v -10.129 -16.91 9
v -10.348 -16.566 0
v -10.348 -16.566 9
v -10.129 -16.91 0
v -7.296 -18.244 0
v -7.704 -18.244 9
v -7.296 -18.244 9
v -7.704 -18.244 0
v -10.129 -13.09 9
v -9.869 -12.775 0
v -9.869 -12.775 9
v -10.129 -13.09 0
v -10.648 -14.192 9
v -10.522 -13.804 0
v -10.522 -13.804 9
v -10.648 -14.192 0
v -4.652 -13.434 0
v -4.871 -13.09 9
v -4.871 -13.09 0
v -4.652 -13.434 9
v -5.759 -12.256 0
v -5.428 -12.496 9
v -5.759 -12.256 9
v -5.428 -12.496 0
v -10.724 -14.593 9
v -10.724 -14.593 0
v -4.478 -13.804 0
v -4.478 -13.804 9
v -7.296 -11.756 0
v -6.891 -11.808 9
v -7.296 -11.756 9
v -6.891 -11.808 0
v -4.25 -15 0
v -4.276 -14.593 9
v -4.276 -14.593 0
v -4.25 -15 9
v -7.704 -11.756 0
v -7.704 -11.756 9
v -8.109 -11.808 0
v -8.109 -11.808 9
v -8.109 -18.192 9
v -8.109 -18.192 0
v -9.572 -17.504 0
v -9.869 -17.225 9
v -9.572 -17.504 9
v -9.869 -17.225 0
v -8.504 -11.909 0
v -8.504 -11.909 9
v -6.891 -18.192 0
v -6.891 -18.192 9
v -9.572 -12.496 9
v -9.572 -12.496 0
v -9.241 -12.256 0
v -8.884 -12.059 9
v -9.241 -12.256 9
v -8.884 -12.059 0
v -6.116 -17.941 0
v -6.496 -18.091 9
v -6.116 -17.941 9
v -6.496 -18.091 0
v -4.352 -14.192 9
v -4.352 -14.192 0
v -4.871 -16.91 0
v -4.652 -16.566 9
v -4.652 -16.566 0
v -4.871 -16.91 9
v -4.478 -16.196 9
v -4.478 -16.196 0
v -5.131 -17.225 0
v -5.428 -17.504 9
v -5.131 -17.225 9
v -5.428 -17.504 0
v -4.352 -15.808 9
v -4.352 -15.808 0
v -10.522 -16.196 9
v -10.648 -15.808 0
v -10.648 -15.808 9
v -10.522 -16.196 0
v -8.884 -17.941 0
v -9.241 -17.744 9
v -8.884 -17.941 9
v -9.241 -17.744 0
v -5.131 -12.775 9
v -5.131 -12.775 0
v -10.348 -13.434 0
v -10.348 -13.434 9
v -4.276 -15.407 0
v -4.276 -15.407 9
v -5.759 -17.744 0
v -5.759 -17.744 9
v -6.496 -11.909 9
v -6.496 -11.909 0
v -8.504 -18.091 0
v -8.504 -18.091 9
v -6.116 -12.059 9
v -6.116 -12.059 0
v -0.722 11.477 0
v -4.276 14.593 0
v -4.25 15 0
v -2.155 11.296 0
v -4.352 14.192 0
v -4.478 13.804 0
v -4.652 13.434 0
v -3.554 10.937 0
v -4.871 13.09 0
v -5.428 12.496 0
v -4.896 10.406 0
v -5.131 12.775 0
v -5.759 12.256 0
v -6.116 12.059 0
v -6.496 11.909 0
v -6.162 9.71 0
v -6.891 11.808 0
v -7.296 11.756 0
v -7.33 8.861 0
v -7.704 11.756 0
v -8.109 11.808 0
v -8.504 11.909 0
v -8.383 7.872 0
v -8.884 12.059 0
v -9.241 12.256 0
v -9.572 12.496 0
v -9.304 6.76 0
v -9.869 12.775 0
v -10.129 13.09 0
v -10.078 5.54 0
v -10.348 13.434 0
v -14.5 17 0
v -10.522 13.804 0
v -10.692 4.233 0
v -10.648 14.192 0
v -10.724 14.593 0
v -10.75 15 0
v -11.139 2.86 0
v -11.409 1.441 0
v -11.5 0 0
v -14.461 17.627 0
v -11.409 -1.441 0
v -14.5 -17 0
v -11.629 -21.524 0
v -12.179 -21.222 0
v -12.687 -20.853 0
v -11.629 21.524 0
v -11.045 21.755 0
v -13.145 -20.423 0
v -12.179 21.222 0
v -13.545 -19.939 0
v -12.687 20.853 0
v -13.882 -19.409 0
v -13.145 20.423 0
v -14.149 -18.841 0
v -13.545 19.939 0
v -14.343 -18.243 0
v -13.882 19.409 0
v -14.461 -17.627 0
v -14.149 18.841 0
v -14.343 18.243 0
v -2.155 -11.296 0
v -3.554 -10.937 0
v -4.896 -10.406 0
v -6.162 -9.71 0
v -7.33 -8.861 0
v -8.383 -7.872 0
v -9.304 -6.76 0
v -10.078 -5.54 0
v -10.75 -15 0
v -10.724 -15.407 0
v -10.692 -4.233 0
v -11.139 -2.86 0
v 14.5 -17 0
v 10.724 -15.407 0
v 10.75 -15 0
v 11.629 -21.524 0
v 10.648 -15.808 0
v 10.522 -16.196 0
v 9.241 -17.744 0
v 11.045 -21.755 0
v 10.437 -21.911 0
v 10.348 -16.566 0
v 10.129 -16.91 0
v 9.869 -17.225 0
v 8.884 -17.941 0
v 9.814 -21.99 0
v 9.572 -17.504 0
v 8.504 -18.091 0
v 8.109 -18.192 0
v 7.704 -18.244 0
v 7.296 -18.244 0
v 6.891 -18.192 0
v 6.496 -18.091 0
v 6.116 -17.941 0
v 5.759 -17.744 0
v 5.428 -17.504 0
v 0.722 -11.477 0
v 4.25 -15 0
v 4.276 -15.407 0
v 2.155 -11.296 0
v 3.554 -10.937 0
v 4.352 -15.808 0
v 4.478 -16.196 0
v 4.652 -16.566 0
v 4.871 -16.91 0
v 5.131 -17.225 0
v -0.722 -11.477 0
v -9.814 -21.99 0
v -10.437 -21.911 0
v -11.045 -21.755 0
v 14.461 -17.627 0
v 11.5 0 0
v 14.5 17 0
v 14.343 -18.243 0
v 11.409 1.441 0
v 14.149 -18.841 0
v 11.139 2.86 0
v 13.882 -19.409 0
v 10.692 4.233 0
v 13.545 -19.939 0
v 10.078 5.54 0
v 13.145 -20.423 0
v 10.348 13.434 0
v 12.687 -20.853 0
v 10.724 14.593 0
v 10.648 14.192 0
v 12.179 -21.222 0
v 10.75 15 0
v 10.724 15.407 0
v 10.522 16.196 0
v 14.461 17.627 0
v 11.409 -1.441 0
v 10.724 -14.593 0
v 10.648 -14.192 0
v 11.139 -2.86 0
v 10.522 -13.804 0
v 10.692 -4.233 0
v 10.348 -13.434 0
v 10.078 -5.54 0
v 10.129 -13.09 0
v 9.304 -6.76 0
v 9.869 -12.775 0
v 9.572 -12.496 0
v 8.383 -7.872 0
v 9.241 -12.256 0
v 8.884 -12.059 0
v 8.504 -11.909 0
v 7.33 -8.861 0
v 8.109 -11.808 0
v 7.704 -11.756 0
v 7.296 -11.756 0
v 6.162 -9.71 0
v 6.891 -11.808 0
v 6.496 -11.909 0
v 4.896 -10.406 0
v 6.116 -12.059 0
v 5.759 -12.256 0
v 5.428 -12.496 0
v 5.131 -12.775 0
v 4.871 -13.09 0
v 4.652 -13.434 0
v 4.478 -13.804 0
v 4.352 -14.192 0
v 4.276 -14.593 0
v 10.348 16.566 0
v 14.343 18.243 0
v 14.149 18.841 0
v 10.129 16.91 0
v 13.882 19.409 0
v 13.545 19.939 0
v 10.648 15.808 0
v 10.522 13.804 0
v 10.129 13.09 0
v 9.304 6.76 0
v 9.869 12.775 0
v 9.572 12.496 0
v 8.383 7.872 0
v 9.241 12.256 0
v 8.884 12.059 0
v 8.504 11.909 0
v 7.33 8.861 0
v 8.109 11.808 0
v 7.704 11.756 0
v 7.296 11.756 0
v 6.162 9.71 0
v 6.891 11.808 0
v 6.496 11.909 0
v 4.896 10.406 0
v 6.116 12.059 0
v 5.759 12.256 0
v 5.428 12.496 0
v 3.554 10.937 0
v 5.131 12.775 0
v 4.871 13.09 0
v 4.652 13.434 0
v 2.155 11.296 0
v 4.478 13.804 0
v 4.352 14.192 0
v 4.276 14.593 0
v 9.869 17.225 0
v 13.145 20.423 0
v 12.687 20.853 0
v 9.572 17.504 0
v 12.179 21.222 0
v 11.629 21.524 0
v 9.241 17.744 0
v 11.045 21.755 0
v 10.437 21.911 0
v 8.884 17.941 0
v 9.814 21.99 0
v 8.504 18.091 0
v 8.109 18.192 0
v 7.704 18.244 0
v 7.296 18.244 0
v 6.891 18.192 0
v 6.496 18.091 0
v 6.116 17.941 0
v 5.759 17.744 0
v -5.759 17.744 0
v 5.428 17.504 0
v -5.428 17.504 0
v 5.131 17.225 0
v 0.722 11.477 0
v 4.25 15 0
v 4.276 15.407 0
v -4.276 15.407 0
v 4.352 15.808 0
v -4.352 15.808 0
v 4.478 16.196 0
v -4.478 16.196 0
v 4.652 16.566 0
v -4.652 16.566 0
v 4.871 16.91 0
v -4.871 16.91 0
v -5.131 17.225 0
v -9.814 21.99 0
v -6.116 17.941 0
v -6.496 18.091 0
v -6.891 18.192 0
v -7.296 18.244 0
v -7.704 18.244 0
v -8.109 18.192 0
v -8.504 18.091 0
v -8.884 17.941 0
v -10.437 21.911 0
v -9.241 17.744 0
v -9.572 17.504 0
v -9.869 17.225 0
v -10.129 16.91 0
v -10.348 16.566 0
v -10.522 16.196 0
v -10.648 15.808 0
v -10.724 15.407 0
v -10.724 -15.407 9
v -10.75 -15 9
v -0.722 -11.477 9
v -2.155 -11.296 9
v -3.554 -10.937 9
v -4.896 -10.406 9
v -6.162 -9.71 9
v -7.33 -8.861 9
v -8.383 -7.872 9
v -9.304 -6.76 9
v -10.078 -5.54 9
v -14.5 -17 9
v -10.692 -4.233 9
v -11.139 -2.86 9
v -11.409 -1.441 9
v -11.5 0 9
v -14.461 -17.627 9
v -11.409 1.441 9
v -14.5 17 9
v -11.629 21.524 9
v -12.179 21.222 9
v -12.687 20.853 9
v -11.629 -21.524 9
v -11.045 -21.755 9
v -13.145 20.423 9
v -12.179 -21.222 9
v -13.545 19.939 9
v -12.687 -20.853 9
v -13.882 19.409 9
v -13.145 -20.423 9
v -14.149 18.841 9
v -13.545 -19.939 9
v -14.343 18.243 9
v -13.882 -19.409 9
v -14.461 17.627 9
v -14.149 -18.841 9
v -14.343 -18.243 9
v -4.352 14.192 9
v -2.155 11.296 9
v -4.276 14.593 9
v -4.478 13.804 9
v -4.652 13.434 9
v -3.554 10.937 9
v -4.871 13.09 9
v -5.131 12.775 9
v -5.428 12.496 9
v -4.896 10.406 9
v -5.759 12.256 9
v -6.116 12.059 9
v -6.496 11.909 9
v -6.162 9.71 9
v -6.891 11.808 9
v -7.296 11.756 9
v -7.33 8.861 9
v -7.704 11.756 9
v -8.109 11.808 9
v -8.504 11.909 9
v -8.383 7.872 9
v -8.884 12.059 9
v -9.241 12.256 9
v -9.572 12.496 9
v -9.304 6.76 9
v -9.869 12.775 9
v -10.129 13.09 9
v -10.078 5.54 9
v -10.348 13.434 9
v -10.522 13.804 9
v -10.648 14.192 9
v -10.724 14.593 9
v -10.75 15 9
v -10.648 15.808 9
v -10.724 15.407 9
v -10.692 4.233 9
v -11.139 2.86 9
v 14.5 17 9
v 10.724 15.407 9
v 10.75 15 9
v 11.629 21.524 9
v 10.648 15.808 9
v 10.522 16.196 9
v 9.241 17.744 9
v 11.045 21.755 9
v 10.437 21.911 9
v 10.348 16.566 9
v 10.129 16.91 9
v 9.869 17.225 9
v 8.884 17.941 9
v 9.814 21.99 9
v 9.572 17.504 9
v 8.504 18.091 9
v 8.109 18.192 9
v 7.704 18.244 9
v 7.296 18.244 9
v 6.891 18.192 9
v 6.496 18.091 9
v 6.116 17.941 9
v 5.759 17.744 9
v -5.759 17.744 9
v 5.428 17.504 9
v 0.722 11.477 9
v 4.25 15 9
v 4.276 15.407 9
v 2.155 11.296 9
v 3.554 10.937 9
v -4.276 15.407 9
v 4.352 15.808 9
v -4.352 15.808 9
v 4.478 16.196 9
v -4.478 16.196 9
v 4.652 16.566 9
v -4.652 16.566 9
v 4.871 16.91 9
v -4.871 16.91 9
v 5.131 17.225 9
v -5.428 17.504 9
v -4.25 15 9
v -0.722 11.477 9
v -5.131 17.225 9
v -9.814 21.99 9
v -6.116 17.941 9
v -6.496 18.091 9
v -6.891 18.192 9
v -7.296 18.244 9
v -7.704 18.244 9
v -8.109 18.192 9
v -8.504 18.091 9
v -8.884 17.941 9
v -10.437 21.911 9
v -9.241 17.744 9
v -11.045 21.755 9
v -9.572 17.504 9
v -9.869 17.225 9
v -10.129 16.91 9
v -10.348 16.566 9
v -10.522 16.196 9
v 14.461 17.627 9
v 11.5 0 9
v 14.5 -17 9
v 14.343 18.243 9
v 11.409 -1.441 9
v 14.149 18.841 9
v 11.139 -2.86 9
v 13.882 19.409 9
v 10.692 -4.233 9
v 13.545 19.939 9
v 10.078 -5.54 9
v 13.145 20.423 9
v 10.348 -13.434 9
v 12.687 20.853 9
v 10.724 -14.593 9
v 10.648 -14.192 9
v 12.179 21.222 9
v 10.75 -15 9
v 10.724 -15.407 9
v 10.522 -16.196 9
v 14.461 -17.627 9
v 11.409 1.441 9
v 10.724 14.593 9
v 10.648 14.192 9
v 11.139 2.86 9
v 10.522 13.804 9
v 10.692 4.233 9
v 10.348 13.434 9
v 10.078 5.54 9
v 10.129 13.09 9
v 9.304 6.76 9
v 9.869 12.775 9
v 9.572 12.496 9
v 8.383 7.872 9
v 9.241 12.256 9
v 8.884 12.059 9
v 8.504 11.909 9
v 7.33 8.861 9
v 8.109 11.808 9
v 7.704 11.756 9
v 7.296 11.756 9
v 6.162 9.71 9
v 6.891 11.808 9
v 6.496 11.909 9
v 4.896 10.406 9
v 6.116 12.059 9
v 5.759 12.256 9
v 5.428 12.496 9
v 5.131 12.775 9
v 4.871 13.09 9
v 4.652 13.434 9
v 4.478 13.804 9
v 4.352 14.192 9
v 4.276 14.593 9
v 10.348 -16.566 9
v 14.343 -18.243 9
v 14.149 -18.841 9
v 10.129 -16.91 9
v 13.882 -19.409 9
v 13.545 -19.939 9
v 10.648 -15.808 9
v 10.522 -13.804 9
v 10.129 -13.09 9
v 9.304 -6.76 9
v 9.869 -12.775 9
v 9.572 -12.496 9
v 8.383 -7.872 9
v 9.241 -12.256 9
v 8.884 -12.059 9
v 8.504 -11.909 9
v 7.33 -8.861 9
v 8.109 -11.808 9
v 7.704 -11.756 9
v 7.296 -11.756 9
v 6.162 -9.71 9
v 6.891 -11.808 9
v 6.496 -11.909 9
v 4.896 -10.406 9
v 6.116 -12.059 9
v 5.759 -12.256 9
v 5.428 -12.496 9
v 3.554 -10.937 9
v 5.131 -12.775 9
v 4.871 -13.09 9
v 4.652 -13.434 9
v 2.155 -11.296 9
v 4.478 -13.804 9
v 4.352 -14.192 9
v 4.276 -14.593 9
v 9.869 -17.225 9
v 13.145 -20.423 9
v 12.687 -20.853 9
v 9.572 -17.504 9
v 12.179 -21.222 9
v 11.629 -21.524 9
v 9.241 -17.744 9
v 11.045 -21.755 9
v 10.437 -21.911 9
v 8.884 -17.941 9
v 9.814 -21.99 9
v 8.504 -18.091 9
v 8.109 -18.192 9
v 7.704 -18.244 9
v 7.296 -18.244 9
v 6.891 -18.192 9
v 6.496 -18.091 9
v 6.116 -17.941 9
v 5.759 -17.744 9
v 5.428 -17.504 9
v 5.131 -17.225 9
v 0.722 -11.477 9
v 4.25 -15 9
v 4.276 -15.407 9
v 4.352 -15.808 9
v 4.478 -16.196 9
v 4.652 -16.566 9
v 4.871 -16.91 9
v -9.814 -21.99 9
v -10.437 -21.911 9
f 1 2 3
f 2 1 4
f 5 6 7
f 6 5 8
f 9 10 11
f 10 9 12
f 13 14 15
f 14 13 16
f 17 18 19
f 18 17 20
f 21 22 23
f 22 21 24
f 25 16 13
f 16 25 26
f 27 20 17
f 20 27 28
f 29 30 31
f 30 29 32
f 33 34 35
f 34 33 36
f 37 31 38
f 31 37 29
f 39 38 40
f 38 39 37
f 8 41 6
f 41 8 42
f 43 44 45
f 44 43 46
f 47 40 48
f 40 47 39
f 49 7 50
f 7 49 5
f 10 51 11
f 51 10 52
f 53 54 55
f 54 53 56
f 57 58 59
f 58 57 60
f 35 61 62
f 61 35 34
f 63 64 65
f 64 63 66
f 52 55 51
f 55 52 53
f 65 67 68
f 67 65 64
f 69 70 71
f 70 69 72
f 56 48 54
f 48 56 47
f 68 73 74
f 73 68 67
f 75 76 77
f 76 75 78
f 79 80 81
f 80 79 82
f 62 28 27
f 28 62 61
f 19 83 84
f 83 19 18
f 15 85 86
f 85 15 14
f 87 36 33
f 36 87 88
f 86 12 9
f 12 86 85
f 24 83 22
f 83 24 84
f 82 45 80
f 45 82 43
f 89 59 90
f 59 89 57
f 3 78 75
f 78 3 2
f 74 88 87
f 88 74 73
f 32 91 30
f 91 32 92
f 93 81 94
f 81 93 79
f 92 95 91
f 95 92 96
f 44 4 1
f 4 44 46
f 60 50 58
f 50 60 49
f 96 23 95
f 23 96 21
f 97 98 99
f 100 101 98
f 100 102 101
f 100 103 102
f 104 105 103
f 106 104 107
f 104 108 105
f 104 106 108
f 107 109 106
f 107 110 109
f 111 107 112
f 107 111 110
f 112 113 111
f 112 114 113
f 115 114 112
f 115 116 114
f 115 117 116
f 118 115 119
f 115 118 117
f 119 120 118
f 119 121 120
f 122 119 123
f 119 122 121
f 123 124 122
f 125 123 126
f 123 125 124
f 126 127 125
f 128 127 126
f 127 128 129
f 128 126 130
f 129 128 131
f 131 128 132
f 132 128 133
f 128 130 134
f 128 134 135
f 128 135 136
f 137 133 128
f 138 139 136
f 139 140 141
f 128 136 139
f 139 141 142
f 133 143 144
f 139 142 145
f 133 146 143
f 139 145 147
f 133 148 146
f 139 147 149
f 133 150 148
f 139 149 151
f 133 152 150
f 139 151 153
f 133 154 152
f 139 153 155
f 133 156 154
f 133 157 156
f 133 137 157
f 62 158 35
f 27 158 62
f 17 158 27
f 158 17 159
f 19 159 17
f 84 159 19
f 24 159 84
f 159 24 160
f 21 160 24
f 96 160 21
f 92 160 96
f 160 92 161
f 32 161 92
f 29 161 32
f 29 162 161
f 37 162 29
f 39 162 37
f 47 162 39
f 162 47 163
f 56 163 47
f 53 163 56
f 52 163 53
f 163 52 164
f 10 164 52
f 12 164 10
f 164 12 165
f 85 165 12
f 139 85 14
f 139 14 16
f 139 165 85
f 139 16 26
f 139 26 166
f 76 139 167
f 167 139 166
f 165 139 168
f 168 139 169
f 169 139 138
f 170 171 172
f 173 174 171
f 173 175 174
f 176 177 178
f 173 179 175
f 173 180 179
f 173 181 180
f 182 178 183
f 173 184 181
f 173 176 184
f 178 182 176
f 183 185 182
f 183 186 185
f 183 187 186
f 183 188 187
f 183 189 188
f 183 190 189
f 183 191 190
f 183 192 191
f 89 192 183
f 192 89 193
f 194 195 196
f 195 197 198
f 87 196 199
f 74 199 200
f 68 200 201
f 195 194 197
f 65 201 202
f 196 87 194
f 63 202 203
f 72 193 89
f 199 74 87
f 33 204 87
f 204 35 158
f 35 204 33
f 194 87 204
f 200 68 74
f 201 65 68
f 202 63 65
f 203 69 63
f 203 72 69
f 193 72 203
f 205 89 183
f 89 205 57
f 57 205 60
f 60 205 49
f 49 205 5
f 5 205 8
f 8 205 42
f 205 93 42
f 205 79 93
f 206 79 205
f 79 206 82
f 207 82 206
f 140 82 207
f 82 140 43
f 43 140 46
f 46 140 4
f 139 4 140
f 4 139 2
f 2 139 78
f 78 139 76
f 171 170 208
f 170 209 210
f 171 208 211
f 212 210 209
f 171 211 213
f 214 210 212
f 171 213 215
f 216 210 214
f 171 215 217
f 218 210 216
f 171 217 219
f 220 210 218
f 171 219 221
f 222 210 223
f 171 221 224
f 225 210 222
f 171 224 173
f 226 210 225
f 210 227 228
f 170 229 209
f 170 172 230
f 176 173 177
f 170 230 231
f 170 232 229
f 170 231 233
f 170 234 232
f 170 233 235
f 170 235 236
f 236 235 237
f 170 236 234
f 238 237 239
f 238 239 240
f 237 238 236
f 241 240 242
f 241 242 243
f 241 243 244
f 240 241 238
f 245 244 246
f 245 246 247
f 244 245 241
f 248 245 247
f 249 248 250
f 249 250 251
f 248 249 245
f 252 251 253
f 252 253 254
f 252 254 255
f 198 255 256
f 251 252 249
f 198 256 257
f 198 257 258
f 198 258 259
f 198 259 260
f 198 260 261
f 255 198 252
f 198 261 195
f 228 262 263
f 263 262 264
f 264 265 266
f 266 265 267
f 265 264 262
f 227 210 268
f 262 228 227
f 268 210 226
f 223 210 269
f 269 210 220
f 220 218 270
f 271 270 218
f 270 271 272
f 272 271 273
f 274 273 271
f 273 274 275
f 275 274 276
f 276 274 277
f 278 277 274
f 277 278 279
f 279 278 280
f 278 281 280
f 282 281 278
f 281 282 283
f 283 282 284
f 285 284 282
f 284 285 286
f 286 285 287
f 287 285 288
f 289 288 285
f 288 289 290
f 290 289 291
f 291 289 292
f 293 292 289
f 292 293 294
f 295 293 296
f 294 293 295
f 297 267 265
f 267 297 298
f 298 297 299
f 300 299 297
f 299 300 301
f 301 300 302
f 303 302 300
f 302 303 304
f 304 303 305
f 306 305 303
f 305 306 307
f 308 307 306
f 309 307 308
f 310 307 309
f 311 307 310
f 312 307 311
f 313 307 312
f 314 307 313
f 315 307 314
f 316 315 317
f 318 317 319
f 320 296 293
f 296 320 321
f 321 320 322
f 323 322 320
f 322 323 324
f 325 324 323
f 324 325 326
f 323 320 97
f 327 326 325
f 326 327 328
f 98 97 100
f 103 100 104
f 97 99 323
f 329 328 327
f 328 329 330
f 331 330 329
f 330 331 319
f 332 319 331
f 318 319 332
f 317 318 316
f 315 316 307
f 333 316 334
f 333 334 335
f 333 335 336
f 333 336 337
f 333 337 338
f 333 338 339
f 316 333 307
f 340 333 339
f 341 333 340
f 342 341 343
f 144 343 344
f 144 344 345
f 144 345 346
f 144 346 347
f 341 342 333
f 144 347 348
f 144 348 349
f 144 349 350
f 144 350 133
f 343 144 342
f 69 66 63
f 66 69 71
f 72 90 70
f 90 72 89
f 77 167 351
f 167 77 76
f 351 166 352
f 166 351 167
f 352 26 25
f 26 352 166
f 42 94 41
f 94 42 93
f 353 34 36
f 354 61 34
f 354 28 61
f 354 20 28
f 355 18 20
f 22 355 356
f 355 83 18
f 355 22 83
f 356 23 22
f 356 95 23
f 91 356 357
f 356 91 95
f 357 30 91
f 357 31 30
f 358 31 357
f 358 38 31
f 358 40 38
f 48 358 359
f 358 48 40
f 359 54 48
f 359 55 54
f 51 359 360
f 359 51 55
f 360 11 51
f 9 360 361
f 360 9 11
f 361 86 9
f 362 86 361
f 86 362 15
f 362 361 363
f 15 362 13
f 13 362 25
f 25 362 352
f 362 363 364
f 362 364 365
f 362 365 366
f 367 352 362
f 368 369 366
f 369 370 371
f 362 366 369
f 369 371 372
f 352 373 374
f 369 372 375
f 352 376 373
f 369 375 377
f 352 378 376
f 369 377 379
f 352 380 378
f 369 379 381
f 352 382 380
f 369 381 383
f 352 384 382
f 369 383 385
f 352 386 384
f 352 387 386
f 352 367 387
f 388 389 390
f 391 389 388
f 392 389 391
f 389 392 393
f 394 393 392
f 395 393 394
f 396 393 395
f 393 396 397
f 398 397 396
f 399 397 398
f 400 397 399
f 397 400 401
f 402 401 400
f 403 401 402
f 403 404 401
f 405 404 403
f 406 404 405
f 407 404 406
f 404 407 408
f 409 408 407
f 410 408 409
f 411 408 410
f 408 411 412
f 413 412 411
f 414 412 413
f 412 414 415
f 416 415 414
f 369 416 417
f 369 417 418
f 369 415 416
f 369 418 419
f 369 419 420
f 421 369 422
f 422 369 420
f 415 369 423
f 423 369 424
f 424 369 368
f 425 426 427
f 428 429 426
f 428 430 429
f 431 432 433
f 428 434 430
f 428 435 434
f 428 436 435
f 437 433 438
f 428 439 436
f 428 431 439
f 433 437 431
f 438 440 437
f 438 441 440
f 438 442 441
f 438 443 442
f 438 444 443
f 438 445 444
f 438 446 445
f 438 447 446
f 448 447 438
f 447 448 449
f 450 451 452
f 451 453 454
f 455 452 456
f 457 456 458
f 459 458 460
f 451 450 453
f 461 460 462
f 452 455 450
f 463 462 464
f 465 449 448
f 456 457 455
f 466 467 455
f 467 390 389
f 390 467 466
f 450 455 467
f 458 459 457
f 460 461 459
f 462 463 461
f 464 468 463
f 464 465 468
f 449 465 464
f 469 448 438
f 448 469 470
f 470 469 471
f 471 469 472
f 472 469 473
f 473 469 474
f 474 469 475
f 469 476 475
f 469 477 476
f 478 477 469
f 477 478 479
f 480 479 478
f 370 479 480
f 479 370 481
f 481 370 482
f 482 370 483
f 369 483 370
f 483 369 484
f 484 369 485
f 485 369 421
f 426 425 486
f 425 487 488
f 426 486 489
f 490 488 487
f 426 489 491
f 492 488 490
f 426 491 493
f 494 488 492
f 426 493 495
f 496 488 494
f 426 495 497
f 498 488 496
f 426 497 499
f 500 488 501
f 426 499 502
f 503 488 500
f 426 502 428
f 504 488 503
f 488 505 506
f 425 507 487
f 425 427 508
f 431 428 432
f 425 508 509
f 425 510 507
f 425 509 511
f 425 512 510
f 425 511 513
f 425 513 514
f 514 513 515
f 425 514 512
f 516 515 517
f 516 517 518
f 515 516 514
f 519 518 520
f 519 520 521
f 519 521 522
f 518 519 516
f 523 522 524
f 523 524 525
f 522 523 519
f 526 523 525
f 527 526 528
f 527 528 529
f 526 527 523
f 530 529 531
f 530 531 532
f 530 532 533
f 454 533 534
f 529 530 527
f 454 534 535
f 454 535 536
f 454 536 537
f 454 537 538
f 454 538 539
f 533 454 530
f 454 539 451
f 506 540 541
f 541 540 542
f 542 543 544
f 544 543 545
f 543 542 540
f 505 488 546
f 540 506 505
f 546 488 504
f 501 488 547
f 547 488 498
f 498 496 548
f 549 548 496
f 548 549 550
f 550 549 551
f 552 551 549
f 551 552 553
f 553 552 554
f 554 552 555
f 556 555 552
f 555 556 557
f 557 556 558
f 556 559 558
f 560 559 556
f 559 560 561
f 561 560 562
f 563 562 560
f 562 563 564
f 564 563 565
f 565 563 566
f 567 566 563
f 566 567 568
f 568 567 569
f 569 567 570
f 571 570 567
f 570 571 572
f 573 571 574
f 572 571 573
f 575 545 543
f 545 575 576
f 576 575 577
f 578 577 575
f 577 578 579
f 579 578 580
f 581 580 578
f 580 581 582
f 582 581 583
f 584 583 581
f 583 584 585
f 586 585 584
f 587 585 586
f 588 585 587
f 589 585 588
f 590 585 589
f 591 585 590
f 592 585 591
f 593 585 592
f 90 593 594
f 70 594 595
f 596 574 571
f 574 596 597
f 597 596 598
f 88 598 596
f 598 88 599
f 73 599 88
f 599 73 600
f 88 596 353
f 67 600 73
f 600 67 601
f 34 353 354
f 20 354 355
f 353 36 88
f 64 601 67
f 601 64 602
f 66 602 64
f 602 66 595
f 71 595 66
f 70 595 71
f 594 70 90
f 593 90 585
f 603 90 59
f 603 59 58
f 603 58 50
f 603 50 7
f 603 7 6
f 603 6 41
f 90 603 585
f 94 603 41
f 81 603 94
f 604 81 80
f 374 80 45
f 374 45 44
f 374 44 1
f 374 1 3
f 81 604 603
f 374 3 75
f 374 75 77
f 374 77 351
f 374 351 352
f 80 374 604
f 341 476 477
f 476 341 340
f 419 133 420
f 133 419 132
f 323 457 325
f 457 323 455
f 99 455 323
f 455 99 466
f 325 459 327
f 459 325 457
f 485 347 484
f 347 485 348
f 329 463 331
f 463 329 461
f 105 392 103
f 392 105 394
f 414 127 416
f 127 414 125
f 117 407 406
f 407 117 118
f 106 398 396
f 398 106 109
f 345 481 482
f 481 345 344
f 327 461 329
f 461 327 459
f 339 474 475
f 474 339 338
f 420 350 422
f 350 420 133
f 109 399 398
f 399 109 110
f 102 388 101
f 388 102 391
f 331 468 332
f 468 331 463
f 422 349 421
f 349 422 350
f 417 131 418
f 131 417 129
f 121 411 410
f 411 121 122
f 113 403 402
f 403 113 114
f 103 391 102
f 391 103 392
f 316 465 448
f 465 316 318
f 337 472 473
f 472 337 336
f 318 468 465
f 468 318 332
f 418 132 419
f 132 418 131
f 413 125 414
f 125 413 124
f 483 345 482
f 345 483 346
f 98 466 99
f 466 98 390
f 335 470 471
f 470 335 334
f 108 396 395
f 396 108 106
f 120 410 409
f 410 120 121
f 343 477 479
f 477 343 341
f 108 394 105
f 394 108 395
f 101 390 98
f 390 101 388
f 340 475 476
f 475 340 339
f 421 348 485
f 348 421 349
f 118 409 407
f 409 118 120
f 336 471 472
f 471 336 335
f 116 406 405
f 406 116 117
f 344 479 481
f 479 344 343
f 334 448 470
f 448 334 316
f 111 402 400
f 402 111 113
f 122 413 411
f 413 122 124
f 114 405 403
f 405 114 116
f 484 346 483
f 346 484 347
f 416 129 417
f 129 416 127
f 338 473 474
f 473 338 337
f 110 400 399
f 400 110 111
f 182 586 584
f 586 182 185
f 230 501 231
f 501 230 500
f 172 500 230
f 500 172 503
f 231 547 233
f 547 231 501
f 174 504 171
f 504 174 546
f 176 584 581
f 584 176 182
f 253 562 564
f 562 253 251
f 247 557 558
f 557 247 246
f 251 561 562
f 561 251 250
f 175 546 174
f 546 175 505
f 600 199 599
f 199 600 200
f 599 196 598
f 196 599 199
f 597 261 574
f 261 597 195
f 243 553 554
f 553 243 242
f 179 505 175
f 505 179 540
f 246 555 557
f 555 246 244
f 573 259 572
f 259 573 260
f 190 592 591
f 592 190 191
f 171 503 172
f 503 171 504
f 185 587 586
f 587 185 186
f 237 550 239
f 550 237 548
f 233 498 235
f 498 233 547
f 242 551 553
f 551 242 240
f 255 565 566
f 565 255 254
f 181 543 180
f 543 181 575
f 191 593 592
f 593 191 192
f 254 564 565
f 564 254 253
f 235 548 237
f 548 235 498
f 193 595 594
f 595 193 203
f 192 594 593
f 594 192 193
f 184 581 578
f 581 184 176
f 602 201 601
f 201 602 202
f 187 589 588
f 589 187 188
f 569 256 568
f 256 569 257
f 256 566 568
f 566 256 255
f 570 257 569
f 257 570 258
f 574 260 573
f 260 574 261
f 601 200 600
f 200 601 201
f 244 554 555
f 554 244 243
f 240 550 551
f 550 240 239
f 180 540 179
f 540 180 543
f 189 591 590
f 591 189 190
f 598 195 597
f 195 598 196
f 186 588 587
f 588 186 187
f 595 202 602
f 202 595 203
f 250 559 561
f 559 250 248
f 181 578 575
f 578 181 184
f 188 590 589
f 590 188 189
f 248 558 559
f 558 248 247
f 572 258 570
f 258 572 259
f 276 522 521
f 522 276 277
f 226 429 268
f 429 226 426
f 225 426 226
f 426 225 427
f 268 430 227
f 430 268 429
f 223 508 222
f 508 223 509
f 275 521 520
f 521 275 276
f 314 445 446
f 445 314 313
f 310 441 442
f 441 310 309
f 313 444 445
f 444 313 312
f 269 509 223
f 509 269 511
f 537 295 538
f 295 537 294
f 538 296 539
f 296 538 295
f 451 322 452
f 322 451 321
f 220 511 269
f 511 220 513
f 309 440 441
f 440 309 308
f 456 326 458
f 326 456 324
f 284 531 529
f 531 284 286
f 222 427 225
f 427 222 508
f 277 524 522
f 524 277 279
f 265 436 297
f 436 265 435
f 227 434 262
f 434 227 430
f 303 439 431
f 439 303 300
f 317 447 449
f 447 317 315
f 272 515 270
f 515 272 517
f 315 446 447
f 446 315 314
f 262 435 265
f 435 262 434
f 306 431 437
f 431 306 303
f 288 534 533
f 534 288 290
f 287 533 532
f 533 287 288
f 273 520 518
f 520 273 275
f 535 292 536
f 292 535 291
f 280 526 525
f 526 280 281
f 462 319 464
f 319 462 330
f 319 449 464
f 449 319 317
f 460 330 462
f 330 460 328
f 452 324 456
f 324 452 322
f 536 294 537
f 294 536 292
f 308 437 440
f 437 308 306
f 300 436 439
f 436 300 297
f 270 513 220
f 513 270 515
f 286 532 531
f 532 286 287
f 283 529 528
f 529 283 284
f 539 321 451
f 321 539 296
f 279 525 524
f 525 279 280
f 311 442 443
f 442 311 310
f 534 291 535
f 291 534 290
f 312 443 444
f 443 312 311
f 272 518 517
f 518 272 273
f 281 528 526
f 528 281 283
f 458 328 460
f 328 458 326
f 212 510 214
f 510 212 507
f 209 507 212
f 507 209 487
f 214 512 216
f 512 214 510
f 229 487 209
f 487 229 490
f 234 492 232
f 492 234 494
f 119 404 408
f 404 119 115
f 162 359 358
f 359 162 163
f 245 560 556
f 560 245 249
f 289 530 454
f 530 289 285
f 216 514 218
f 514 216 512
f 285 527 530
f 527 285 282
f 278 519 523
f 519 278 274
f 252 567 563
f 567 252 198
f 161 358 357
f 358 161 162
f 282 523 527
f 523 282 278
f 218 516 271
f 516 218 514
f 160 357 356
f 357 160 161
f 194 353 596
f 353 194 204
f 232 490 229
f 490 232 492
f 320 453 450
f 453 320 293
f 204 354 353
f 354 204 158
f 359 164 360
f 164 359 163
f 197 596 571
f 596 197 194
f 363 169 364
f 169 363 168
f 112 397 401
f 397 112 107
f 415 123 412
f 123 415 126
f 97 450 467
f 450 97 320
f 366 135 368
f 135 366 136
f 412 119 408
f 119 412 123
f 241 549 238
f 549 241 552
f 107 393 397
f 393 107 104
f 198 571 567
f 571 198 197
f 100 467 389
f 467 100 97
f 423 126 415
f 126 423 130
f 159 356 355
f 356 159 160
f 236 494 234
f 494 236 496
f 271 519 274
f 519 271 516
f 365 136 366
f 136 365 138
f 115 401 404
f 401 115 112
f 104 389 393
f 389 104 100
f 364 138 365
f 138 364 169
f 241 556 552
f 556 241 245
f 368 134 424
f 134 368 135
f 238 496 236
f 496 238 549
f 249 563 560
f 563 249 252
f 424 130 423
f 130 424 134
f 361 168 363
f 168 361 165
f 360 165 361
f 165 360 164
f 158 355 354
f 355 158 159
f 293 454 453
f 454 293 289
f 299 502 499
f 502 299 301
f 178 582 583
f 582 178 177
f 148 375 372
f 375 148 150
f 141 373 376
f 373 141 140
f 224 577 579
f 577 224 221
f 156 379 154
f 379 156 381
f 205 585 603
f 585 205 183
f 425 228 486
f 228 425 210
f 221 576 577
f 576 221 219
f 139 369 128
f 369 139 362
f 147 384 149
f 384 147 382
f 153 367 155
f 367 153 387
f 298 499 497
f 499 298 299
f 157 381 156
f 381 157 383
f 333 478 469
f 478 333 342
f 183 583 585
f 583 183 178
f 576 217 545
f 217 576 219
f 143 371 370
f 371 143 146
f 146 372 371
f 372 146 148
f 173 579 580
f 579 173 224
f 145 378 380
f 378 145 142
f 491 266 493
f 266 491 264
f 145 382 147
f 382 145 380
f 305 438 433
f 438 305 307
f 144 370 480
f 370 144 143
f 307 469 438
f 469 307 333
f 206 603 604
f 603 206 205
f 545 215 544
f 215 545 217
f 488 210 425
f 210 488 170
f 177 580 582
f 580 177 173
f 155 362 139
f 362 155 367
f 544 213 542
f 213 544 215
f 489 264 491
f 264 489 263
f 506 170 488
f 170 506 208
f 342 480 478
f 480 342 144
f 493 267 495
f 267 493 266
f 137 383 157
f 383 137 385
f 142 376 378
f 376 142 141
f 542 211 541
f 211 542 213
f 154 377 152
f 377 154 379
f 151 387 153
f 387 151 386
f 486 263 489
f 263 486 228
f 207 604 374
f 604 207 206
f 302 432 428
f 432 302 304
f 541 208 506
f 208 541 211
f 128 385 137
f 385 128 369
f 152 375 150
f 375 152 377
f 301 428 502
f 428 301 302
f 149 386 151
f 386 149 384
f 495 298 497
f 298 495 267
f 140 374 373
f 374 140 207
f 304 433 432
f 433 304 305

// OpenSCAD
$fn = 50;

difference() {
	union() {
		hull() {
			translate(v = [-9.5, 17.0, 0]) {
				cylinder(h = 9, r = 5);
			}
			translate(v = [9.5, 17.0, 0]) {
				cylinder(h = 9, r = 5);
			}
			translate(v = [-9.5, -17.0, 0]) {
				cylinder(h = 9, r = 5);
			}
			translate(v = [9.5, -17.0, 0]) {
				cylinder(h = 9, r = 5);
			}
		}
	}
	union() {
		translate(v = [-7.5, -15.0, 0]) {
			cylinder(h = 9, r = 3.25);
		}
		translate(v = [-7.5, 15.0, 0]) {
			cylinder(h = 9, r = 3.25);
		}
		translate(v = [7.5, -15.0, 0]) {
			cylinder(h = 9, r = 3.25);
		}
		translate(v = [7.5, 15.0, 0]) {
			cylinder(h = 9, r = 3.25);
		}
		cylinder(h = 9, r = 11.5);
	}
}
